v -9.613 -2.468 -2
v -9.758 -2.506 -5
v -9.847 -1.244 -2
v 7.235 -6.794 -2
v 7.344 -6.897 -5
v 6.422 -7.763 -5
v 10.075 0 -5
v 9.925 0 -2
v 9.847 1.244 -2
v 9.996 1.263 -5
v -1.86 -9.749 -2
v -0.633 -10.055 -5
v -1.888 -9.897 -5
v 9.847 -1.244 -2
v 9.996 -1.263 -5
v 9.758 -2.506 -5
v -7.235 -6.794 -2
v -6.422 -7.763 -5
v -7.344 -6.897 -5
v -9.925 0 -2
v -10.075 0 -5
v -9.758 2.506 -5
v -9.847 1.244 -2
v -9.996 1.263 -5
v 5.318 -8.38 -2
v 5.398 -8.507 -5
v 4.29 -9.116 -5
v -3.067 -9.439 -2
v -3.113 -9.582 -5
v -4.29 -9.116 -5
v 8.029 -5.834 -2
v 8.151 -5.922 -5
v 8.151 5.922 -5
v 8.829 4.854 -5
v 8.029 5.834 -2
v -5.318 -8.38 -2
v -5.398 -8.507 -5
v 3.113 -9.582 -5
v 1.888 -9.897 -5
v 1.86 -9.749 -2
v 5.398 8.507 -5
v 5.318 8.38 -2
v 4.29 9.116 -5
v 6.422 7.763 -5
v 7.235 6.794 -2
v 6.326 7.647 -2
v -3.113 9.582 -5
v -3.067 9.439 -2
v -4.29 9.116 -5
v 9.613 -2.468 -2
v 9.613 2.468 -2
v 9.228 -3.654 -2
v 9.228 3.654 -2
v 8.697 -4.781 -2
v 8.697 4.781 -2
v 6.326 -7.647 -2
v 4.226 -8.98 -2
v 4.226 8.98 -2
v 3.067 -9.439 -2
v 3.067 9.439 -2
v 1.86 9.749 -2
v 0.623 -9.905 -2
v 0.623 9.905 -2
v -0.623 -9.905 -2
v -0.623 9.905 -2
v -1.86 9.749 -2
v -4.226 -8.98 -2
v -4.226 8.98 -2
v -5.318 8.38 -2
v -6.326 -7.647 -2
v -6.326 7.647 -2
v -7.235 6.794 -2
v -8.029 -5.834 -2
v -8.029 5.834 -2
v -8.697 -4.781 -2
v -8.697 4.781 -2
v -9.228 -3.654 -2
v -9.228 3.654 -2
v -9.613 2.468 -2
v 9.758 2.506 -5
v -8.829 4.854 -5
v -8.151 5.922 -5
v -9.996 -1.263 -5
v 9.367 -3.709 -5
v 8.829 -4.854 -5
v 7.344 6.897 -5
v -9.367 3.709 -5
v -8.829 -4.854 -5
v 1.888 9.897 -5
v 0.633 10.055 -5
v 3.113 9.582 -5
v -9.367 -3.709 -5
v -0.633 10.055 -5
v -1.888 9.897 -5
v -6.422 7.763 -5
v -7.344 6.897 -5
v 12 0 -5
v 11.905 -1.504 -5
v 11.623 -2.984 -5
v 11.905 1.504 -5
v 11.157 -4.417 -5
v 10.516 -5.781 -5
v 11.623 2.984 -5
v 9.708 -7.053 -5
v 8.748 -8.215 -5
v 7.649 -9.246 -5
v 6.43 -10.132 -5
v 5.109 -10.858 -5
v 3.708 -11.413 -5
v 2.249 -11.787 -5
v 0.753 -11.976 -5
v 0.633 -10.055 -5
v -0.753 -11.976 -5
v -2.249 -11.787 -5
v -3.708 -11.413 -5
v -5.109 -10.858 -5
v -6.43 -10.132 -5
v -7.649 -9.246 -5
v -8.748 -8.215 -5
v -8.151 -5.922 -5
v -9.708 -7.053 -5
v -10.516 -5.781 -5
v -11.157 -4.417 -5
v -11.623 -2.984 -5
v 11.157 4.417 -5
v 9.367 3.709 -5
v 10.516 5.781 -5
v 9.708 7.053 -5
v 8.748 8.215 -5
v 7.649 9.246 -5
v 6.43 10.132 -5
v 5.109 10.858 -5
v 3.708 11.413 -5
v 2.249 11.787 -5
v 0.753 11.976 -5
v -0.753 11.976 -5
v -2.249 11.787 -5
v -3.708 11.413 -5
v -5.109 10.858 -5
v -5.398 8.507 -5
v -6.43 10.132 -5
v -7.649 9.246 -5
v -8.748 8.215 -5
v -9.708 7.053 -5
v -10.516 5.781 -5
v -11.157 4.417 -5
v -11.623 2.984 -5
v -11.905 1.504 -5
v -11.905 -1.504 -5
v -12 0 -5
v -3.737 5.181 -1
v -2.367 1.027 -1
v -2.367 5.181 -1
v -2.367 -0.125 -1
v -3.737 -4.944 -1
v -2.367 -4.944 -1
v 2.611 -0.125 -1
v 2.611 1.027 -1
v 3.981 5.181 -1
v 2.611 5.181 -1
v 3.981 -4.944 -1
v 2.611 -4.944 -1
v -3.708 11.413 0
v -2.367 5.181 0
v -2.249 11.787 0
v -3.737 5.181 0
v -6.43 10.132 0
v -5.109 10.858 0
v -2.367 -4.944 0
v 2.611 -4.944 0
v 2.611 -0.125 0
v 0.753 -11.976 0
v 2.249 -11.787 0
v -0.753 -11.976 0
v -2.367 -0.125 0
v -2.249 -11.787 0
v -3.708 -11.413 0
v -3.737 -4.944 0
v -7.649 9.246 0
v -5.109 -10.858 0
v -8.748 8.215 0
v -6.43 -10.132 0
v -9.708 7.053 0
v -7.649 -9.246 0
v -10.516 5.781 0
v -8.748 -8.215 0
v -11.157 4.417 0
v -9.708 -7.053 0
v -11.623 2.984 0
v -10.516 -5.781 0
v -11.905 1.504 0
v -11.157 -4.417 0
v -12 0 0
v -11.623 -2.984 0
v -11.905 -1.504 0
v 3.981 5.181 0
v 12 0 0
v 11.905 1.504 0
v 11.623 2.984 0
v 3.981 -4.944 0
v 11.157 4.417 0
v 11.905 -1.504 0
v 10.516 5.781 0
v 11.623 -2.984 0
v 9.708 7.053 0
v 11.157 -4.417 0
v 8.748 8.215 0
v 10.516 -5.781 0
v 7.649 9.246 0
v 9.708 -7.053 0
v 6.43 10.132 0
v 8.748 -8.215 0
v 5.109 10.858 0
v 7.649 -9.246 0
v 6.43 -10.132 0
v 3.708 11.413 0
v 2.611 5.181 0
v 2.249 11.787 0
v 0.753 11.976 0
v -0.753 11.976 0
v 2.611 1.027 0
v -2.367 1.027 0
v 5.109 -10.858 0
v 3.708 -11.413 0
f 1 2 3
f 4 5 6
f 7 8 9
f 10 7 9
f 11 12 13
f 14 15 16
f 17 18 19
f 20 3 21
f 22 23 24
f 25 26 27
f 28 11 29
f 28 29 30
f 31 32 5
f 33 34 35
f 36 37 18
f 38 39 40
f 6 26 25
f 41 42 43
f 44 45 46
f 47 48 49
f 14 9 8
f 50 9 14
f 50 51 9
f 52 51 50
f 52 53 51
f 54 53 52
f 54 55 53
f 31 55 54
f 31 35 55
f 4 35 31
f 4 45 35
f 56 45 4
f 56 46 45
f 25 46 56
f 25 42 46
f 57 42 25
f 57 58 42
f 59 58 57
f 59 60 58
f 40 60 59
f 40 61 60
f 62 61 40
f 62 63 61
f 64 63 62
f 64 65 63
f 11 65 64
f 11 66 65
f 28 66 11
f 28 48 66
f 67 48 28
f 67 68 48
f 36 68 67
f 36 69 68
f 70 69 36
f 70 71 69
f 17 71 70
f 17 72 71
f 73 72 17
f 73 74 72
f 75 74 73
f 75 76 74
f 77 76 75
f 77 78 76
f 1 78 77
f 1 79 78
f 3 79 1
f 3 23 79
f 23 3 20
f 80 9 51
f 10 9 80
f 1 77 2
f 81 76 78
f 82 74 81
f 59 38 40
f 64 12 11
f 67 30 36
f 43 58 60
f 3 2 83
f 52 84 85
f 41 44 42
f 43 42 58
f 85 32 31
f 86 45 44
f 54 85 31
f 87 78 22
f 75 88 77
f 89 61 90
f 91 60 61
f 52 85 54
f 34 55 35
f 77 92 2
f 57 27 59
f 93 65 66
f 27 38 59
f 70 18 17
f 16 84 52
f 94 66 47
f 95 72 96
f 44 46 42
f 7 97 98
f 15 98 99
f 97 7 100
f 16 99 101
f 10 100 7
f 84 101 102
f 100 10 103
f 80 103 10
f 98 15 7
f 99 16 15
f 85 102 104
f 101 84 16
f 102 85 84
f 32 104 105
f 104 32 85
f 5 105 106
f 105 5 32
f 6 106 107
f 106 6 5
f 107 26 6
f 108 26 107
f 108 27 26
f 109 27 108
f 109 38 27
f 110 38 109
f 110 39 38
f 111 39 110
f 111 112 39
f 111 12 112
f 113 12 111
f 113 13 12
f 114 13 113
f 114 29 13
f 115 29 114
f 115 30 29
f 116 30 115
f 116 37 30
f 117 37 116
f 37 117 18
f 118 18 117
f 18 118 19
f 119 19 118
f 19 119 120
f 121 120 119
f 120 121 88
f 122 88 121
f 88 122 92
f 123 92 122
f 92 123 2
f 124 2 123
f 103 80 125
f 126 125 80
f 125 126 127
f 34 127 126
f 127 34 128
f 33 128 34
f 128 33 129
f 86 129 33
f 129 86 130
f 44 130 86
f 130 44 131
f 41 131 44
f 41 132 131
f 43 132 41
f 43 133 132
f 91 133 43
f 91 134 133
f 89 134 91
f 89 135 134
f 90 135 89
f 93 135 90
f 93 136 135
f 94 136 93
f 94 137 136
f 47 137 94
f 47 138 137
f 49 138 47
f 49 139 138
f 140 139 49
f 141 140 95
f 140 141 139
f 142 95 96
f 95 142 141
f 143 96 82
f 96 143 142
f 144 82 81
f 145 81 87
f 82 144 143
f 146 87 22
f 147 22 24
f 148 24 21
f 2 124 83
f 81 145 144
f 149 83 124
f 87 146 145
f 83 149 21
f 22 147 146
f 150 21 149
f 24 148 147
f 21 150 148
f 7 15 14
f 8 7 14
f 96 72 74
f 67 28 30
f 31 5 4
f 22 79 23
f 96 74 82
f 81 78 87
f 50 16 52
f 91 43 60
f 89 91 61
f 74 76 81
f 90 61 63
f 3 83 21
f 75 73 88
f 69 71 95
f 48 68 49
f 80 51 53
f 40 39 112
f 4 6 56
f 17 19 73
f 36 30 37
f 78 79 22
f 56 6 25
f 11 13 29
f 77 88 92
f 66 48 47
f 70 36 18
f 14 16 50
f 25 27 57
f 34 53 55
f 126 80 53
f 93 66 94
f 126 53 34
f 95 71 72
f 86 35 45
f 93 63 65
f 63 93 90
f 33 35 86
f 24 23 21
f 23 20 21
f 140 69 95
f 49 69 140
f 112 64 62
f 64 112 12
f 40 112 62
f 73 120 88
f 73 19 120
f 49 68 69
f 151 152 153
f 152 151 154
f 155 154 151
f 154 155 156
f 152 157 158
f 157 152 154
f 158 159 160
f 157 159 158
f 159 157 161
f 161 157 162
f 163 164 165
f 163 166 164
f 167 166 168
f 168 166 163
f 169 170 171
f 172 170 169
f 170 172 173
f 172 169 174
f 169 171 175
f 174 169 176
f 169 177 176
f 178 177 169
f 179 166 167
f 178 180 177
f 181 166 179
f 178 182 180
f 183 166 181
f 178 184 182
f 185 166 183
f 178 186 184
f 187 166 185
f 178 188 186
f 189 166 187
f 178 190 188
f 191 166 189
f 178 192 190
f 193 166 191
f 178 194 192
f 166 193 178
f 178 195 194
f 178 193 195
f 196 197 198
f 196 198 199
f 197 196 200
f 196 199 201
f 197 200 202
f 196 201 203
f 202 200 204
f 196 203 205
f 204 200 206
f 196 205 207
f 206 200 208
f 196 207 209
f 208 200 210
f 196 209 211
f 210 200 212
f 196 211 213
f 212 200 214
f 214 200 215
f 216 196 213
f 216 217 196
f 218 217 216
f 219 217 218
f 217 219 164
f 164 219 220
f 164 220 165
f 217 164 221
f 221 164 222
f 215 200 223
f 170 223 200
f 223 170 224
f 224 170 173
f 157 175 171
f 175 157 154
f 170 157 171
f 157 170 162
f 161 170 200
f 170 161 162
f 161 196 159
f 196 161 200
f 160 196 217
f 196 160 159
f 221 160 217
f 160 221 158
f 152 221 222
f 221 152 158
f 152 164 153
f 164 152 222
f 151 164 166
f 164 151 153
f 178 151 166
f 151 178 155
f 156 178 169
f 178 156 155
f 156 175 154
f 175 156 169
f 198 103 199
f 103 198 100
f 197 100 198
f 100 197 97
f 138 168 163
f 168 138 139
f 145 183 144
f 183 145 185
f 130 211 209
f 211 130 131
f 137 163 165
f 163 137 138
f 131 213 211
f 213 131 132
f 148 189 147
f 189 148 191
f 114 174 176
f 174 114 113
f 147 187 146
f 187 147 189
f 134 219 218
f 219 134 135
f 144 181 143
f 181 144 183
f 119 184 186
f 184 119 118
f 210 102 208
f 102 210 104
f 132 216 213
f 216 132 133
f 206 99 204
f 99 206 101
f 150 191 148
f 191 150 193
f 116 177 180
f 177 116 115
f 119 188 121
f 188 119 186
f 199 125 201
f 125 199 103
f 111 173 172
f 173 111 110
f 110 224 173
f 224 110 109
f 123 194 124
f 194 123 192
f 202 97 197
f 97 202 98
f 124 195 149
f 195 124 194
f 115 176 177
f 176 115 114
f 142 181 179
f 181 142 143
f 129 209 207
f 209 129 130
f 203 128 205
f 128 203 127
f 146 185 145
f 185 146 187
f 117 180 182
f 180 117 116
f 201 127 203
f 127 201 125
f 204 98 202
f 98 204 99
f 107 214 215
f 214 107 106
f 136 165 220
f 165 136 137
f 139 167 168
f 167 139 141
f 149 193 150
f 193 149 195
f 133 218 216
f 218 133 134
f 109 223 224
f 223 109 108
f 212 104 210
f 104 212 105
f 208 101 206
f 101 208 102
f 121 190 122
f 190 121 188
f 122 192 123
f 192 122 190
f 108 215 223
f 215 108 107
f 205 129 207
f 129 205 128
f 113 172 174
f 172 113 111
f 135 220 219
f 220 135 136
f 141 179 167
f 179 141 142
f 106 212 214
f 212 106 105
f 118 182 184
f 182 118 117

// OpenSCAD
$fn = 50;


difference() {
	union() {
		translate(v = [0, 0, -5.0000000000]) {
			cylinder(h = 5, r = 12.0000000000);
		}
	}
	union() {
		#translate(v = [0, 0, -5.0000000000]) {
			cylinder(h = 3, r1 = 10.0750000000, r2 = 9.9250000000);
		}
		translate(v = [0, 0, -1]) {
			linear_extrude(height = 1) {
				text(font = "Impact", halign = "center", size = 10, text = "H", valign = "center");
			}
		}
	}
}
